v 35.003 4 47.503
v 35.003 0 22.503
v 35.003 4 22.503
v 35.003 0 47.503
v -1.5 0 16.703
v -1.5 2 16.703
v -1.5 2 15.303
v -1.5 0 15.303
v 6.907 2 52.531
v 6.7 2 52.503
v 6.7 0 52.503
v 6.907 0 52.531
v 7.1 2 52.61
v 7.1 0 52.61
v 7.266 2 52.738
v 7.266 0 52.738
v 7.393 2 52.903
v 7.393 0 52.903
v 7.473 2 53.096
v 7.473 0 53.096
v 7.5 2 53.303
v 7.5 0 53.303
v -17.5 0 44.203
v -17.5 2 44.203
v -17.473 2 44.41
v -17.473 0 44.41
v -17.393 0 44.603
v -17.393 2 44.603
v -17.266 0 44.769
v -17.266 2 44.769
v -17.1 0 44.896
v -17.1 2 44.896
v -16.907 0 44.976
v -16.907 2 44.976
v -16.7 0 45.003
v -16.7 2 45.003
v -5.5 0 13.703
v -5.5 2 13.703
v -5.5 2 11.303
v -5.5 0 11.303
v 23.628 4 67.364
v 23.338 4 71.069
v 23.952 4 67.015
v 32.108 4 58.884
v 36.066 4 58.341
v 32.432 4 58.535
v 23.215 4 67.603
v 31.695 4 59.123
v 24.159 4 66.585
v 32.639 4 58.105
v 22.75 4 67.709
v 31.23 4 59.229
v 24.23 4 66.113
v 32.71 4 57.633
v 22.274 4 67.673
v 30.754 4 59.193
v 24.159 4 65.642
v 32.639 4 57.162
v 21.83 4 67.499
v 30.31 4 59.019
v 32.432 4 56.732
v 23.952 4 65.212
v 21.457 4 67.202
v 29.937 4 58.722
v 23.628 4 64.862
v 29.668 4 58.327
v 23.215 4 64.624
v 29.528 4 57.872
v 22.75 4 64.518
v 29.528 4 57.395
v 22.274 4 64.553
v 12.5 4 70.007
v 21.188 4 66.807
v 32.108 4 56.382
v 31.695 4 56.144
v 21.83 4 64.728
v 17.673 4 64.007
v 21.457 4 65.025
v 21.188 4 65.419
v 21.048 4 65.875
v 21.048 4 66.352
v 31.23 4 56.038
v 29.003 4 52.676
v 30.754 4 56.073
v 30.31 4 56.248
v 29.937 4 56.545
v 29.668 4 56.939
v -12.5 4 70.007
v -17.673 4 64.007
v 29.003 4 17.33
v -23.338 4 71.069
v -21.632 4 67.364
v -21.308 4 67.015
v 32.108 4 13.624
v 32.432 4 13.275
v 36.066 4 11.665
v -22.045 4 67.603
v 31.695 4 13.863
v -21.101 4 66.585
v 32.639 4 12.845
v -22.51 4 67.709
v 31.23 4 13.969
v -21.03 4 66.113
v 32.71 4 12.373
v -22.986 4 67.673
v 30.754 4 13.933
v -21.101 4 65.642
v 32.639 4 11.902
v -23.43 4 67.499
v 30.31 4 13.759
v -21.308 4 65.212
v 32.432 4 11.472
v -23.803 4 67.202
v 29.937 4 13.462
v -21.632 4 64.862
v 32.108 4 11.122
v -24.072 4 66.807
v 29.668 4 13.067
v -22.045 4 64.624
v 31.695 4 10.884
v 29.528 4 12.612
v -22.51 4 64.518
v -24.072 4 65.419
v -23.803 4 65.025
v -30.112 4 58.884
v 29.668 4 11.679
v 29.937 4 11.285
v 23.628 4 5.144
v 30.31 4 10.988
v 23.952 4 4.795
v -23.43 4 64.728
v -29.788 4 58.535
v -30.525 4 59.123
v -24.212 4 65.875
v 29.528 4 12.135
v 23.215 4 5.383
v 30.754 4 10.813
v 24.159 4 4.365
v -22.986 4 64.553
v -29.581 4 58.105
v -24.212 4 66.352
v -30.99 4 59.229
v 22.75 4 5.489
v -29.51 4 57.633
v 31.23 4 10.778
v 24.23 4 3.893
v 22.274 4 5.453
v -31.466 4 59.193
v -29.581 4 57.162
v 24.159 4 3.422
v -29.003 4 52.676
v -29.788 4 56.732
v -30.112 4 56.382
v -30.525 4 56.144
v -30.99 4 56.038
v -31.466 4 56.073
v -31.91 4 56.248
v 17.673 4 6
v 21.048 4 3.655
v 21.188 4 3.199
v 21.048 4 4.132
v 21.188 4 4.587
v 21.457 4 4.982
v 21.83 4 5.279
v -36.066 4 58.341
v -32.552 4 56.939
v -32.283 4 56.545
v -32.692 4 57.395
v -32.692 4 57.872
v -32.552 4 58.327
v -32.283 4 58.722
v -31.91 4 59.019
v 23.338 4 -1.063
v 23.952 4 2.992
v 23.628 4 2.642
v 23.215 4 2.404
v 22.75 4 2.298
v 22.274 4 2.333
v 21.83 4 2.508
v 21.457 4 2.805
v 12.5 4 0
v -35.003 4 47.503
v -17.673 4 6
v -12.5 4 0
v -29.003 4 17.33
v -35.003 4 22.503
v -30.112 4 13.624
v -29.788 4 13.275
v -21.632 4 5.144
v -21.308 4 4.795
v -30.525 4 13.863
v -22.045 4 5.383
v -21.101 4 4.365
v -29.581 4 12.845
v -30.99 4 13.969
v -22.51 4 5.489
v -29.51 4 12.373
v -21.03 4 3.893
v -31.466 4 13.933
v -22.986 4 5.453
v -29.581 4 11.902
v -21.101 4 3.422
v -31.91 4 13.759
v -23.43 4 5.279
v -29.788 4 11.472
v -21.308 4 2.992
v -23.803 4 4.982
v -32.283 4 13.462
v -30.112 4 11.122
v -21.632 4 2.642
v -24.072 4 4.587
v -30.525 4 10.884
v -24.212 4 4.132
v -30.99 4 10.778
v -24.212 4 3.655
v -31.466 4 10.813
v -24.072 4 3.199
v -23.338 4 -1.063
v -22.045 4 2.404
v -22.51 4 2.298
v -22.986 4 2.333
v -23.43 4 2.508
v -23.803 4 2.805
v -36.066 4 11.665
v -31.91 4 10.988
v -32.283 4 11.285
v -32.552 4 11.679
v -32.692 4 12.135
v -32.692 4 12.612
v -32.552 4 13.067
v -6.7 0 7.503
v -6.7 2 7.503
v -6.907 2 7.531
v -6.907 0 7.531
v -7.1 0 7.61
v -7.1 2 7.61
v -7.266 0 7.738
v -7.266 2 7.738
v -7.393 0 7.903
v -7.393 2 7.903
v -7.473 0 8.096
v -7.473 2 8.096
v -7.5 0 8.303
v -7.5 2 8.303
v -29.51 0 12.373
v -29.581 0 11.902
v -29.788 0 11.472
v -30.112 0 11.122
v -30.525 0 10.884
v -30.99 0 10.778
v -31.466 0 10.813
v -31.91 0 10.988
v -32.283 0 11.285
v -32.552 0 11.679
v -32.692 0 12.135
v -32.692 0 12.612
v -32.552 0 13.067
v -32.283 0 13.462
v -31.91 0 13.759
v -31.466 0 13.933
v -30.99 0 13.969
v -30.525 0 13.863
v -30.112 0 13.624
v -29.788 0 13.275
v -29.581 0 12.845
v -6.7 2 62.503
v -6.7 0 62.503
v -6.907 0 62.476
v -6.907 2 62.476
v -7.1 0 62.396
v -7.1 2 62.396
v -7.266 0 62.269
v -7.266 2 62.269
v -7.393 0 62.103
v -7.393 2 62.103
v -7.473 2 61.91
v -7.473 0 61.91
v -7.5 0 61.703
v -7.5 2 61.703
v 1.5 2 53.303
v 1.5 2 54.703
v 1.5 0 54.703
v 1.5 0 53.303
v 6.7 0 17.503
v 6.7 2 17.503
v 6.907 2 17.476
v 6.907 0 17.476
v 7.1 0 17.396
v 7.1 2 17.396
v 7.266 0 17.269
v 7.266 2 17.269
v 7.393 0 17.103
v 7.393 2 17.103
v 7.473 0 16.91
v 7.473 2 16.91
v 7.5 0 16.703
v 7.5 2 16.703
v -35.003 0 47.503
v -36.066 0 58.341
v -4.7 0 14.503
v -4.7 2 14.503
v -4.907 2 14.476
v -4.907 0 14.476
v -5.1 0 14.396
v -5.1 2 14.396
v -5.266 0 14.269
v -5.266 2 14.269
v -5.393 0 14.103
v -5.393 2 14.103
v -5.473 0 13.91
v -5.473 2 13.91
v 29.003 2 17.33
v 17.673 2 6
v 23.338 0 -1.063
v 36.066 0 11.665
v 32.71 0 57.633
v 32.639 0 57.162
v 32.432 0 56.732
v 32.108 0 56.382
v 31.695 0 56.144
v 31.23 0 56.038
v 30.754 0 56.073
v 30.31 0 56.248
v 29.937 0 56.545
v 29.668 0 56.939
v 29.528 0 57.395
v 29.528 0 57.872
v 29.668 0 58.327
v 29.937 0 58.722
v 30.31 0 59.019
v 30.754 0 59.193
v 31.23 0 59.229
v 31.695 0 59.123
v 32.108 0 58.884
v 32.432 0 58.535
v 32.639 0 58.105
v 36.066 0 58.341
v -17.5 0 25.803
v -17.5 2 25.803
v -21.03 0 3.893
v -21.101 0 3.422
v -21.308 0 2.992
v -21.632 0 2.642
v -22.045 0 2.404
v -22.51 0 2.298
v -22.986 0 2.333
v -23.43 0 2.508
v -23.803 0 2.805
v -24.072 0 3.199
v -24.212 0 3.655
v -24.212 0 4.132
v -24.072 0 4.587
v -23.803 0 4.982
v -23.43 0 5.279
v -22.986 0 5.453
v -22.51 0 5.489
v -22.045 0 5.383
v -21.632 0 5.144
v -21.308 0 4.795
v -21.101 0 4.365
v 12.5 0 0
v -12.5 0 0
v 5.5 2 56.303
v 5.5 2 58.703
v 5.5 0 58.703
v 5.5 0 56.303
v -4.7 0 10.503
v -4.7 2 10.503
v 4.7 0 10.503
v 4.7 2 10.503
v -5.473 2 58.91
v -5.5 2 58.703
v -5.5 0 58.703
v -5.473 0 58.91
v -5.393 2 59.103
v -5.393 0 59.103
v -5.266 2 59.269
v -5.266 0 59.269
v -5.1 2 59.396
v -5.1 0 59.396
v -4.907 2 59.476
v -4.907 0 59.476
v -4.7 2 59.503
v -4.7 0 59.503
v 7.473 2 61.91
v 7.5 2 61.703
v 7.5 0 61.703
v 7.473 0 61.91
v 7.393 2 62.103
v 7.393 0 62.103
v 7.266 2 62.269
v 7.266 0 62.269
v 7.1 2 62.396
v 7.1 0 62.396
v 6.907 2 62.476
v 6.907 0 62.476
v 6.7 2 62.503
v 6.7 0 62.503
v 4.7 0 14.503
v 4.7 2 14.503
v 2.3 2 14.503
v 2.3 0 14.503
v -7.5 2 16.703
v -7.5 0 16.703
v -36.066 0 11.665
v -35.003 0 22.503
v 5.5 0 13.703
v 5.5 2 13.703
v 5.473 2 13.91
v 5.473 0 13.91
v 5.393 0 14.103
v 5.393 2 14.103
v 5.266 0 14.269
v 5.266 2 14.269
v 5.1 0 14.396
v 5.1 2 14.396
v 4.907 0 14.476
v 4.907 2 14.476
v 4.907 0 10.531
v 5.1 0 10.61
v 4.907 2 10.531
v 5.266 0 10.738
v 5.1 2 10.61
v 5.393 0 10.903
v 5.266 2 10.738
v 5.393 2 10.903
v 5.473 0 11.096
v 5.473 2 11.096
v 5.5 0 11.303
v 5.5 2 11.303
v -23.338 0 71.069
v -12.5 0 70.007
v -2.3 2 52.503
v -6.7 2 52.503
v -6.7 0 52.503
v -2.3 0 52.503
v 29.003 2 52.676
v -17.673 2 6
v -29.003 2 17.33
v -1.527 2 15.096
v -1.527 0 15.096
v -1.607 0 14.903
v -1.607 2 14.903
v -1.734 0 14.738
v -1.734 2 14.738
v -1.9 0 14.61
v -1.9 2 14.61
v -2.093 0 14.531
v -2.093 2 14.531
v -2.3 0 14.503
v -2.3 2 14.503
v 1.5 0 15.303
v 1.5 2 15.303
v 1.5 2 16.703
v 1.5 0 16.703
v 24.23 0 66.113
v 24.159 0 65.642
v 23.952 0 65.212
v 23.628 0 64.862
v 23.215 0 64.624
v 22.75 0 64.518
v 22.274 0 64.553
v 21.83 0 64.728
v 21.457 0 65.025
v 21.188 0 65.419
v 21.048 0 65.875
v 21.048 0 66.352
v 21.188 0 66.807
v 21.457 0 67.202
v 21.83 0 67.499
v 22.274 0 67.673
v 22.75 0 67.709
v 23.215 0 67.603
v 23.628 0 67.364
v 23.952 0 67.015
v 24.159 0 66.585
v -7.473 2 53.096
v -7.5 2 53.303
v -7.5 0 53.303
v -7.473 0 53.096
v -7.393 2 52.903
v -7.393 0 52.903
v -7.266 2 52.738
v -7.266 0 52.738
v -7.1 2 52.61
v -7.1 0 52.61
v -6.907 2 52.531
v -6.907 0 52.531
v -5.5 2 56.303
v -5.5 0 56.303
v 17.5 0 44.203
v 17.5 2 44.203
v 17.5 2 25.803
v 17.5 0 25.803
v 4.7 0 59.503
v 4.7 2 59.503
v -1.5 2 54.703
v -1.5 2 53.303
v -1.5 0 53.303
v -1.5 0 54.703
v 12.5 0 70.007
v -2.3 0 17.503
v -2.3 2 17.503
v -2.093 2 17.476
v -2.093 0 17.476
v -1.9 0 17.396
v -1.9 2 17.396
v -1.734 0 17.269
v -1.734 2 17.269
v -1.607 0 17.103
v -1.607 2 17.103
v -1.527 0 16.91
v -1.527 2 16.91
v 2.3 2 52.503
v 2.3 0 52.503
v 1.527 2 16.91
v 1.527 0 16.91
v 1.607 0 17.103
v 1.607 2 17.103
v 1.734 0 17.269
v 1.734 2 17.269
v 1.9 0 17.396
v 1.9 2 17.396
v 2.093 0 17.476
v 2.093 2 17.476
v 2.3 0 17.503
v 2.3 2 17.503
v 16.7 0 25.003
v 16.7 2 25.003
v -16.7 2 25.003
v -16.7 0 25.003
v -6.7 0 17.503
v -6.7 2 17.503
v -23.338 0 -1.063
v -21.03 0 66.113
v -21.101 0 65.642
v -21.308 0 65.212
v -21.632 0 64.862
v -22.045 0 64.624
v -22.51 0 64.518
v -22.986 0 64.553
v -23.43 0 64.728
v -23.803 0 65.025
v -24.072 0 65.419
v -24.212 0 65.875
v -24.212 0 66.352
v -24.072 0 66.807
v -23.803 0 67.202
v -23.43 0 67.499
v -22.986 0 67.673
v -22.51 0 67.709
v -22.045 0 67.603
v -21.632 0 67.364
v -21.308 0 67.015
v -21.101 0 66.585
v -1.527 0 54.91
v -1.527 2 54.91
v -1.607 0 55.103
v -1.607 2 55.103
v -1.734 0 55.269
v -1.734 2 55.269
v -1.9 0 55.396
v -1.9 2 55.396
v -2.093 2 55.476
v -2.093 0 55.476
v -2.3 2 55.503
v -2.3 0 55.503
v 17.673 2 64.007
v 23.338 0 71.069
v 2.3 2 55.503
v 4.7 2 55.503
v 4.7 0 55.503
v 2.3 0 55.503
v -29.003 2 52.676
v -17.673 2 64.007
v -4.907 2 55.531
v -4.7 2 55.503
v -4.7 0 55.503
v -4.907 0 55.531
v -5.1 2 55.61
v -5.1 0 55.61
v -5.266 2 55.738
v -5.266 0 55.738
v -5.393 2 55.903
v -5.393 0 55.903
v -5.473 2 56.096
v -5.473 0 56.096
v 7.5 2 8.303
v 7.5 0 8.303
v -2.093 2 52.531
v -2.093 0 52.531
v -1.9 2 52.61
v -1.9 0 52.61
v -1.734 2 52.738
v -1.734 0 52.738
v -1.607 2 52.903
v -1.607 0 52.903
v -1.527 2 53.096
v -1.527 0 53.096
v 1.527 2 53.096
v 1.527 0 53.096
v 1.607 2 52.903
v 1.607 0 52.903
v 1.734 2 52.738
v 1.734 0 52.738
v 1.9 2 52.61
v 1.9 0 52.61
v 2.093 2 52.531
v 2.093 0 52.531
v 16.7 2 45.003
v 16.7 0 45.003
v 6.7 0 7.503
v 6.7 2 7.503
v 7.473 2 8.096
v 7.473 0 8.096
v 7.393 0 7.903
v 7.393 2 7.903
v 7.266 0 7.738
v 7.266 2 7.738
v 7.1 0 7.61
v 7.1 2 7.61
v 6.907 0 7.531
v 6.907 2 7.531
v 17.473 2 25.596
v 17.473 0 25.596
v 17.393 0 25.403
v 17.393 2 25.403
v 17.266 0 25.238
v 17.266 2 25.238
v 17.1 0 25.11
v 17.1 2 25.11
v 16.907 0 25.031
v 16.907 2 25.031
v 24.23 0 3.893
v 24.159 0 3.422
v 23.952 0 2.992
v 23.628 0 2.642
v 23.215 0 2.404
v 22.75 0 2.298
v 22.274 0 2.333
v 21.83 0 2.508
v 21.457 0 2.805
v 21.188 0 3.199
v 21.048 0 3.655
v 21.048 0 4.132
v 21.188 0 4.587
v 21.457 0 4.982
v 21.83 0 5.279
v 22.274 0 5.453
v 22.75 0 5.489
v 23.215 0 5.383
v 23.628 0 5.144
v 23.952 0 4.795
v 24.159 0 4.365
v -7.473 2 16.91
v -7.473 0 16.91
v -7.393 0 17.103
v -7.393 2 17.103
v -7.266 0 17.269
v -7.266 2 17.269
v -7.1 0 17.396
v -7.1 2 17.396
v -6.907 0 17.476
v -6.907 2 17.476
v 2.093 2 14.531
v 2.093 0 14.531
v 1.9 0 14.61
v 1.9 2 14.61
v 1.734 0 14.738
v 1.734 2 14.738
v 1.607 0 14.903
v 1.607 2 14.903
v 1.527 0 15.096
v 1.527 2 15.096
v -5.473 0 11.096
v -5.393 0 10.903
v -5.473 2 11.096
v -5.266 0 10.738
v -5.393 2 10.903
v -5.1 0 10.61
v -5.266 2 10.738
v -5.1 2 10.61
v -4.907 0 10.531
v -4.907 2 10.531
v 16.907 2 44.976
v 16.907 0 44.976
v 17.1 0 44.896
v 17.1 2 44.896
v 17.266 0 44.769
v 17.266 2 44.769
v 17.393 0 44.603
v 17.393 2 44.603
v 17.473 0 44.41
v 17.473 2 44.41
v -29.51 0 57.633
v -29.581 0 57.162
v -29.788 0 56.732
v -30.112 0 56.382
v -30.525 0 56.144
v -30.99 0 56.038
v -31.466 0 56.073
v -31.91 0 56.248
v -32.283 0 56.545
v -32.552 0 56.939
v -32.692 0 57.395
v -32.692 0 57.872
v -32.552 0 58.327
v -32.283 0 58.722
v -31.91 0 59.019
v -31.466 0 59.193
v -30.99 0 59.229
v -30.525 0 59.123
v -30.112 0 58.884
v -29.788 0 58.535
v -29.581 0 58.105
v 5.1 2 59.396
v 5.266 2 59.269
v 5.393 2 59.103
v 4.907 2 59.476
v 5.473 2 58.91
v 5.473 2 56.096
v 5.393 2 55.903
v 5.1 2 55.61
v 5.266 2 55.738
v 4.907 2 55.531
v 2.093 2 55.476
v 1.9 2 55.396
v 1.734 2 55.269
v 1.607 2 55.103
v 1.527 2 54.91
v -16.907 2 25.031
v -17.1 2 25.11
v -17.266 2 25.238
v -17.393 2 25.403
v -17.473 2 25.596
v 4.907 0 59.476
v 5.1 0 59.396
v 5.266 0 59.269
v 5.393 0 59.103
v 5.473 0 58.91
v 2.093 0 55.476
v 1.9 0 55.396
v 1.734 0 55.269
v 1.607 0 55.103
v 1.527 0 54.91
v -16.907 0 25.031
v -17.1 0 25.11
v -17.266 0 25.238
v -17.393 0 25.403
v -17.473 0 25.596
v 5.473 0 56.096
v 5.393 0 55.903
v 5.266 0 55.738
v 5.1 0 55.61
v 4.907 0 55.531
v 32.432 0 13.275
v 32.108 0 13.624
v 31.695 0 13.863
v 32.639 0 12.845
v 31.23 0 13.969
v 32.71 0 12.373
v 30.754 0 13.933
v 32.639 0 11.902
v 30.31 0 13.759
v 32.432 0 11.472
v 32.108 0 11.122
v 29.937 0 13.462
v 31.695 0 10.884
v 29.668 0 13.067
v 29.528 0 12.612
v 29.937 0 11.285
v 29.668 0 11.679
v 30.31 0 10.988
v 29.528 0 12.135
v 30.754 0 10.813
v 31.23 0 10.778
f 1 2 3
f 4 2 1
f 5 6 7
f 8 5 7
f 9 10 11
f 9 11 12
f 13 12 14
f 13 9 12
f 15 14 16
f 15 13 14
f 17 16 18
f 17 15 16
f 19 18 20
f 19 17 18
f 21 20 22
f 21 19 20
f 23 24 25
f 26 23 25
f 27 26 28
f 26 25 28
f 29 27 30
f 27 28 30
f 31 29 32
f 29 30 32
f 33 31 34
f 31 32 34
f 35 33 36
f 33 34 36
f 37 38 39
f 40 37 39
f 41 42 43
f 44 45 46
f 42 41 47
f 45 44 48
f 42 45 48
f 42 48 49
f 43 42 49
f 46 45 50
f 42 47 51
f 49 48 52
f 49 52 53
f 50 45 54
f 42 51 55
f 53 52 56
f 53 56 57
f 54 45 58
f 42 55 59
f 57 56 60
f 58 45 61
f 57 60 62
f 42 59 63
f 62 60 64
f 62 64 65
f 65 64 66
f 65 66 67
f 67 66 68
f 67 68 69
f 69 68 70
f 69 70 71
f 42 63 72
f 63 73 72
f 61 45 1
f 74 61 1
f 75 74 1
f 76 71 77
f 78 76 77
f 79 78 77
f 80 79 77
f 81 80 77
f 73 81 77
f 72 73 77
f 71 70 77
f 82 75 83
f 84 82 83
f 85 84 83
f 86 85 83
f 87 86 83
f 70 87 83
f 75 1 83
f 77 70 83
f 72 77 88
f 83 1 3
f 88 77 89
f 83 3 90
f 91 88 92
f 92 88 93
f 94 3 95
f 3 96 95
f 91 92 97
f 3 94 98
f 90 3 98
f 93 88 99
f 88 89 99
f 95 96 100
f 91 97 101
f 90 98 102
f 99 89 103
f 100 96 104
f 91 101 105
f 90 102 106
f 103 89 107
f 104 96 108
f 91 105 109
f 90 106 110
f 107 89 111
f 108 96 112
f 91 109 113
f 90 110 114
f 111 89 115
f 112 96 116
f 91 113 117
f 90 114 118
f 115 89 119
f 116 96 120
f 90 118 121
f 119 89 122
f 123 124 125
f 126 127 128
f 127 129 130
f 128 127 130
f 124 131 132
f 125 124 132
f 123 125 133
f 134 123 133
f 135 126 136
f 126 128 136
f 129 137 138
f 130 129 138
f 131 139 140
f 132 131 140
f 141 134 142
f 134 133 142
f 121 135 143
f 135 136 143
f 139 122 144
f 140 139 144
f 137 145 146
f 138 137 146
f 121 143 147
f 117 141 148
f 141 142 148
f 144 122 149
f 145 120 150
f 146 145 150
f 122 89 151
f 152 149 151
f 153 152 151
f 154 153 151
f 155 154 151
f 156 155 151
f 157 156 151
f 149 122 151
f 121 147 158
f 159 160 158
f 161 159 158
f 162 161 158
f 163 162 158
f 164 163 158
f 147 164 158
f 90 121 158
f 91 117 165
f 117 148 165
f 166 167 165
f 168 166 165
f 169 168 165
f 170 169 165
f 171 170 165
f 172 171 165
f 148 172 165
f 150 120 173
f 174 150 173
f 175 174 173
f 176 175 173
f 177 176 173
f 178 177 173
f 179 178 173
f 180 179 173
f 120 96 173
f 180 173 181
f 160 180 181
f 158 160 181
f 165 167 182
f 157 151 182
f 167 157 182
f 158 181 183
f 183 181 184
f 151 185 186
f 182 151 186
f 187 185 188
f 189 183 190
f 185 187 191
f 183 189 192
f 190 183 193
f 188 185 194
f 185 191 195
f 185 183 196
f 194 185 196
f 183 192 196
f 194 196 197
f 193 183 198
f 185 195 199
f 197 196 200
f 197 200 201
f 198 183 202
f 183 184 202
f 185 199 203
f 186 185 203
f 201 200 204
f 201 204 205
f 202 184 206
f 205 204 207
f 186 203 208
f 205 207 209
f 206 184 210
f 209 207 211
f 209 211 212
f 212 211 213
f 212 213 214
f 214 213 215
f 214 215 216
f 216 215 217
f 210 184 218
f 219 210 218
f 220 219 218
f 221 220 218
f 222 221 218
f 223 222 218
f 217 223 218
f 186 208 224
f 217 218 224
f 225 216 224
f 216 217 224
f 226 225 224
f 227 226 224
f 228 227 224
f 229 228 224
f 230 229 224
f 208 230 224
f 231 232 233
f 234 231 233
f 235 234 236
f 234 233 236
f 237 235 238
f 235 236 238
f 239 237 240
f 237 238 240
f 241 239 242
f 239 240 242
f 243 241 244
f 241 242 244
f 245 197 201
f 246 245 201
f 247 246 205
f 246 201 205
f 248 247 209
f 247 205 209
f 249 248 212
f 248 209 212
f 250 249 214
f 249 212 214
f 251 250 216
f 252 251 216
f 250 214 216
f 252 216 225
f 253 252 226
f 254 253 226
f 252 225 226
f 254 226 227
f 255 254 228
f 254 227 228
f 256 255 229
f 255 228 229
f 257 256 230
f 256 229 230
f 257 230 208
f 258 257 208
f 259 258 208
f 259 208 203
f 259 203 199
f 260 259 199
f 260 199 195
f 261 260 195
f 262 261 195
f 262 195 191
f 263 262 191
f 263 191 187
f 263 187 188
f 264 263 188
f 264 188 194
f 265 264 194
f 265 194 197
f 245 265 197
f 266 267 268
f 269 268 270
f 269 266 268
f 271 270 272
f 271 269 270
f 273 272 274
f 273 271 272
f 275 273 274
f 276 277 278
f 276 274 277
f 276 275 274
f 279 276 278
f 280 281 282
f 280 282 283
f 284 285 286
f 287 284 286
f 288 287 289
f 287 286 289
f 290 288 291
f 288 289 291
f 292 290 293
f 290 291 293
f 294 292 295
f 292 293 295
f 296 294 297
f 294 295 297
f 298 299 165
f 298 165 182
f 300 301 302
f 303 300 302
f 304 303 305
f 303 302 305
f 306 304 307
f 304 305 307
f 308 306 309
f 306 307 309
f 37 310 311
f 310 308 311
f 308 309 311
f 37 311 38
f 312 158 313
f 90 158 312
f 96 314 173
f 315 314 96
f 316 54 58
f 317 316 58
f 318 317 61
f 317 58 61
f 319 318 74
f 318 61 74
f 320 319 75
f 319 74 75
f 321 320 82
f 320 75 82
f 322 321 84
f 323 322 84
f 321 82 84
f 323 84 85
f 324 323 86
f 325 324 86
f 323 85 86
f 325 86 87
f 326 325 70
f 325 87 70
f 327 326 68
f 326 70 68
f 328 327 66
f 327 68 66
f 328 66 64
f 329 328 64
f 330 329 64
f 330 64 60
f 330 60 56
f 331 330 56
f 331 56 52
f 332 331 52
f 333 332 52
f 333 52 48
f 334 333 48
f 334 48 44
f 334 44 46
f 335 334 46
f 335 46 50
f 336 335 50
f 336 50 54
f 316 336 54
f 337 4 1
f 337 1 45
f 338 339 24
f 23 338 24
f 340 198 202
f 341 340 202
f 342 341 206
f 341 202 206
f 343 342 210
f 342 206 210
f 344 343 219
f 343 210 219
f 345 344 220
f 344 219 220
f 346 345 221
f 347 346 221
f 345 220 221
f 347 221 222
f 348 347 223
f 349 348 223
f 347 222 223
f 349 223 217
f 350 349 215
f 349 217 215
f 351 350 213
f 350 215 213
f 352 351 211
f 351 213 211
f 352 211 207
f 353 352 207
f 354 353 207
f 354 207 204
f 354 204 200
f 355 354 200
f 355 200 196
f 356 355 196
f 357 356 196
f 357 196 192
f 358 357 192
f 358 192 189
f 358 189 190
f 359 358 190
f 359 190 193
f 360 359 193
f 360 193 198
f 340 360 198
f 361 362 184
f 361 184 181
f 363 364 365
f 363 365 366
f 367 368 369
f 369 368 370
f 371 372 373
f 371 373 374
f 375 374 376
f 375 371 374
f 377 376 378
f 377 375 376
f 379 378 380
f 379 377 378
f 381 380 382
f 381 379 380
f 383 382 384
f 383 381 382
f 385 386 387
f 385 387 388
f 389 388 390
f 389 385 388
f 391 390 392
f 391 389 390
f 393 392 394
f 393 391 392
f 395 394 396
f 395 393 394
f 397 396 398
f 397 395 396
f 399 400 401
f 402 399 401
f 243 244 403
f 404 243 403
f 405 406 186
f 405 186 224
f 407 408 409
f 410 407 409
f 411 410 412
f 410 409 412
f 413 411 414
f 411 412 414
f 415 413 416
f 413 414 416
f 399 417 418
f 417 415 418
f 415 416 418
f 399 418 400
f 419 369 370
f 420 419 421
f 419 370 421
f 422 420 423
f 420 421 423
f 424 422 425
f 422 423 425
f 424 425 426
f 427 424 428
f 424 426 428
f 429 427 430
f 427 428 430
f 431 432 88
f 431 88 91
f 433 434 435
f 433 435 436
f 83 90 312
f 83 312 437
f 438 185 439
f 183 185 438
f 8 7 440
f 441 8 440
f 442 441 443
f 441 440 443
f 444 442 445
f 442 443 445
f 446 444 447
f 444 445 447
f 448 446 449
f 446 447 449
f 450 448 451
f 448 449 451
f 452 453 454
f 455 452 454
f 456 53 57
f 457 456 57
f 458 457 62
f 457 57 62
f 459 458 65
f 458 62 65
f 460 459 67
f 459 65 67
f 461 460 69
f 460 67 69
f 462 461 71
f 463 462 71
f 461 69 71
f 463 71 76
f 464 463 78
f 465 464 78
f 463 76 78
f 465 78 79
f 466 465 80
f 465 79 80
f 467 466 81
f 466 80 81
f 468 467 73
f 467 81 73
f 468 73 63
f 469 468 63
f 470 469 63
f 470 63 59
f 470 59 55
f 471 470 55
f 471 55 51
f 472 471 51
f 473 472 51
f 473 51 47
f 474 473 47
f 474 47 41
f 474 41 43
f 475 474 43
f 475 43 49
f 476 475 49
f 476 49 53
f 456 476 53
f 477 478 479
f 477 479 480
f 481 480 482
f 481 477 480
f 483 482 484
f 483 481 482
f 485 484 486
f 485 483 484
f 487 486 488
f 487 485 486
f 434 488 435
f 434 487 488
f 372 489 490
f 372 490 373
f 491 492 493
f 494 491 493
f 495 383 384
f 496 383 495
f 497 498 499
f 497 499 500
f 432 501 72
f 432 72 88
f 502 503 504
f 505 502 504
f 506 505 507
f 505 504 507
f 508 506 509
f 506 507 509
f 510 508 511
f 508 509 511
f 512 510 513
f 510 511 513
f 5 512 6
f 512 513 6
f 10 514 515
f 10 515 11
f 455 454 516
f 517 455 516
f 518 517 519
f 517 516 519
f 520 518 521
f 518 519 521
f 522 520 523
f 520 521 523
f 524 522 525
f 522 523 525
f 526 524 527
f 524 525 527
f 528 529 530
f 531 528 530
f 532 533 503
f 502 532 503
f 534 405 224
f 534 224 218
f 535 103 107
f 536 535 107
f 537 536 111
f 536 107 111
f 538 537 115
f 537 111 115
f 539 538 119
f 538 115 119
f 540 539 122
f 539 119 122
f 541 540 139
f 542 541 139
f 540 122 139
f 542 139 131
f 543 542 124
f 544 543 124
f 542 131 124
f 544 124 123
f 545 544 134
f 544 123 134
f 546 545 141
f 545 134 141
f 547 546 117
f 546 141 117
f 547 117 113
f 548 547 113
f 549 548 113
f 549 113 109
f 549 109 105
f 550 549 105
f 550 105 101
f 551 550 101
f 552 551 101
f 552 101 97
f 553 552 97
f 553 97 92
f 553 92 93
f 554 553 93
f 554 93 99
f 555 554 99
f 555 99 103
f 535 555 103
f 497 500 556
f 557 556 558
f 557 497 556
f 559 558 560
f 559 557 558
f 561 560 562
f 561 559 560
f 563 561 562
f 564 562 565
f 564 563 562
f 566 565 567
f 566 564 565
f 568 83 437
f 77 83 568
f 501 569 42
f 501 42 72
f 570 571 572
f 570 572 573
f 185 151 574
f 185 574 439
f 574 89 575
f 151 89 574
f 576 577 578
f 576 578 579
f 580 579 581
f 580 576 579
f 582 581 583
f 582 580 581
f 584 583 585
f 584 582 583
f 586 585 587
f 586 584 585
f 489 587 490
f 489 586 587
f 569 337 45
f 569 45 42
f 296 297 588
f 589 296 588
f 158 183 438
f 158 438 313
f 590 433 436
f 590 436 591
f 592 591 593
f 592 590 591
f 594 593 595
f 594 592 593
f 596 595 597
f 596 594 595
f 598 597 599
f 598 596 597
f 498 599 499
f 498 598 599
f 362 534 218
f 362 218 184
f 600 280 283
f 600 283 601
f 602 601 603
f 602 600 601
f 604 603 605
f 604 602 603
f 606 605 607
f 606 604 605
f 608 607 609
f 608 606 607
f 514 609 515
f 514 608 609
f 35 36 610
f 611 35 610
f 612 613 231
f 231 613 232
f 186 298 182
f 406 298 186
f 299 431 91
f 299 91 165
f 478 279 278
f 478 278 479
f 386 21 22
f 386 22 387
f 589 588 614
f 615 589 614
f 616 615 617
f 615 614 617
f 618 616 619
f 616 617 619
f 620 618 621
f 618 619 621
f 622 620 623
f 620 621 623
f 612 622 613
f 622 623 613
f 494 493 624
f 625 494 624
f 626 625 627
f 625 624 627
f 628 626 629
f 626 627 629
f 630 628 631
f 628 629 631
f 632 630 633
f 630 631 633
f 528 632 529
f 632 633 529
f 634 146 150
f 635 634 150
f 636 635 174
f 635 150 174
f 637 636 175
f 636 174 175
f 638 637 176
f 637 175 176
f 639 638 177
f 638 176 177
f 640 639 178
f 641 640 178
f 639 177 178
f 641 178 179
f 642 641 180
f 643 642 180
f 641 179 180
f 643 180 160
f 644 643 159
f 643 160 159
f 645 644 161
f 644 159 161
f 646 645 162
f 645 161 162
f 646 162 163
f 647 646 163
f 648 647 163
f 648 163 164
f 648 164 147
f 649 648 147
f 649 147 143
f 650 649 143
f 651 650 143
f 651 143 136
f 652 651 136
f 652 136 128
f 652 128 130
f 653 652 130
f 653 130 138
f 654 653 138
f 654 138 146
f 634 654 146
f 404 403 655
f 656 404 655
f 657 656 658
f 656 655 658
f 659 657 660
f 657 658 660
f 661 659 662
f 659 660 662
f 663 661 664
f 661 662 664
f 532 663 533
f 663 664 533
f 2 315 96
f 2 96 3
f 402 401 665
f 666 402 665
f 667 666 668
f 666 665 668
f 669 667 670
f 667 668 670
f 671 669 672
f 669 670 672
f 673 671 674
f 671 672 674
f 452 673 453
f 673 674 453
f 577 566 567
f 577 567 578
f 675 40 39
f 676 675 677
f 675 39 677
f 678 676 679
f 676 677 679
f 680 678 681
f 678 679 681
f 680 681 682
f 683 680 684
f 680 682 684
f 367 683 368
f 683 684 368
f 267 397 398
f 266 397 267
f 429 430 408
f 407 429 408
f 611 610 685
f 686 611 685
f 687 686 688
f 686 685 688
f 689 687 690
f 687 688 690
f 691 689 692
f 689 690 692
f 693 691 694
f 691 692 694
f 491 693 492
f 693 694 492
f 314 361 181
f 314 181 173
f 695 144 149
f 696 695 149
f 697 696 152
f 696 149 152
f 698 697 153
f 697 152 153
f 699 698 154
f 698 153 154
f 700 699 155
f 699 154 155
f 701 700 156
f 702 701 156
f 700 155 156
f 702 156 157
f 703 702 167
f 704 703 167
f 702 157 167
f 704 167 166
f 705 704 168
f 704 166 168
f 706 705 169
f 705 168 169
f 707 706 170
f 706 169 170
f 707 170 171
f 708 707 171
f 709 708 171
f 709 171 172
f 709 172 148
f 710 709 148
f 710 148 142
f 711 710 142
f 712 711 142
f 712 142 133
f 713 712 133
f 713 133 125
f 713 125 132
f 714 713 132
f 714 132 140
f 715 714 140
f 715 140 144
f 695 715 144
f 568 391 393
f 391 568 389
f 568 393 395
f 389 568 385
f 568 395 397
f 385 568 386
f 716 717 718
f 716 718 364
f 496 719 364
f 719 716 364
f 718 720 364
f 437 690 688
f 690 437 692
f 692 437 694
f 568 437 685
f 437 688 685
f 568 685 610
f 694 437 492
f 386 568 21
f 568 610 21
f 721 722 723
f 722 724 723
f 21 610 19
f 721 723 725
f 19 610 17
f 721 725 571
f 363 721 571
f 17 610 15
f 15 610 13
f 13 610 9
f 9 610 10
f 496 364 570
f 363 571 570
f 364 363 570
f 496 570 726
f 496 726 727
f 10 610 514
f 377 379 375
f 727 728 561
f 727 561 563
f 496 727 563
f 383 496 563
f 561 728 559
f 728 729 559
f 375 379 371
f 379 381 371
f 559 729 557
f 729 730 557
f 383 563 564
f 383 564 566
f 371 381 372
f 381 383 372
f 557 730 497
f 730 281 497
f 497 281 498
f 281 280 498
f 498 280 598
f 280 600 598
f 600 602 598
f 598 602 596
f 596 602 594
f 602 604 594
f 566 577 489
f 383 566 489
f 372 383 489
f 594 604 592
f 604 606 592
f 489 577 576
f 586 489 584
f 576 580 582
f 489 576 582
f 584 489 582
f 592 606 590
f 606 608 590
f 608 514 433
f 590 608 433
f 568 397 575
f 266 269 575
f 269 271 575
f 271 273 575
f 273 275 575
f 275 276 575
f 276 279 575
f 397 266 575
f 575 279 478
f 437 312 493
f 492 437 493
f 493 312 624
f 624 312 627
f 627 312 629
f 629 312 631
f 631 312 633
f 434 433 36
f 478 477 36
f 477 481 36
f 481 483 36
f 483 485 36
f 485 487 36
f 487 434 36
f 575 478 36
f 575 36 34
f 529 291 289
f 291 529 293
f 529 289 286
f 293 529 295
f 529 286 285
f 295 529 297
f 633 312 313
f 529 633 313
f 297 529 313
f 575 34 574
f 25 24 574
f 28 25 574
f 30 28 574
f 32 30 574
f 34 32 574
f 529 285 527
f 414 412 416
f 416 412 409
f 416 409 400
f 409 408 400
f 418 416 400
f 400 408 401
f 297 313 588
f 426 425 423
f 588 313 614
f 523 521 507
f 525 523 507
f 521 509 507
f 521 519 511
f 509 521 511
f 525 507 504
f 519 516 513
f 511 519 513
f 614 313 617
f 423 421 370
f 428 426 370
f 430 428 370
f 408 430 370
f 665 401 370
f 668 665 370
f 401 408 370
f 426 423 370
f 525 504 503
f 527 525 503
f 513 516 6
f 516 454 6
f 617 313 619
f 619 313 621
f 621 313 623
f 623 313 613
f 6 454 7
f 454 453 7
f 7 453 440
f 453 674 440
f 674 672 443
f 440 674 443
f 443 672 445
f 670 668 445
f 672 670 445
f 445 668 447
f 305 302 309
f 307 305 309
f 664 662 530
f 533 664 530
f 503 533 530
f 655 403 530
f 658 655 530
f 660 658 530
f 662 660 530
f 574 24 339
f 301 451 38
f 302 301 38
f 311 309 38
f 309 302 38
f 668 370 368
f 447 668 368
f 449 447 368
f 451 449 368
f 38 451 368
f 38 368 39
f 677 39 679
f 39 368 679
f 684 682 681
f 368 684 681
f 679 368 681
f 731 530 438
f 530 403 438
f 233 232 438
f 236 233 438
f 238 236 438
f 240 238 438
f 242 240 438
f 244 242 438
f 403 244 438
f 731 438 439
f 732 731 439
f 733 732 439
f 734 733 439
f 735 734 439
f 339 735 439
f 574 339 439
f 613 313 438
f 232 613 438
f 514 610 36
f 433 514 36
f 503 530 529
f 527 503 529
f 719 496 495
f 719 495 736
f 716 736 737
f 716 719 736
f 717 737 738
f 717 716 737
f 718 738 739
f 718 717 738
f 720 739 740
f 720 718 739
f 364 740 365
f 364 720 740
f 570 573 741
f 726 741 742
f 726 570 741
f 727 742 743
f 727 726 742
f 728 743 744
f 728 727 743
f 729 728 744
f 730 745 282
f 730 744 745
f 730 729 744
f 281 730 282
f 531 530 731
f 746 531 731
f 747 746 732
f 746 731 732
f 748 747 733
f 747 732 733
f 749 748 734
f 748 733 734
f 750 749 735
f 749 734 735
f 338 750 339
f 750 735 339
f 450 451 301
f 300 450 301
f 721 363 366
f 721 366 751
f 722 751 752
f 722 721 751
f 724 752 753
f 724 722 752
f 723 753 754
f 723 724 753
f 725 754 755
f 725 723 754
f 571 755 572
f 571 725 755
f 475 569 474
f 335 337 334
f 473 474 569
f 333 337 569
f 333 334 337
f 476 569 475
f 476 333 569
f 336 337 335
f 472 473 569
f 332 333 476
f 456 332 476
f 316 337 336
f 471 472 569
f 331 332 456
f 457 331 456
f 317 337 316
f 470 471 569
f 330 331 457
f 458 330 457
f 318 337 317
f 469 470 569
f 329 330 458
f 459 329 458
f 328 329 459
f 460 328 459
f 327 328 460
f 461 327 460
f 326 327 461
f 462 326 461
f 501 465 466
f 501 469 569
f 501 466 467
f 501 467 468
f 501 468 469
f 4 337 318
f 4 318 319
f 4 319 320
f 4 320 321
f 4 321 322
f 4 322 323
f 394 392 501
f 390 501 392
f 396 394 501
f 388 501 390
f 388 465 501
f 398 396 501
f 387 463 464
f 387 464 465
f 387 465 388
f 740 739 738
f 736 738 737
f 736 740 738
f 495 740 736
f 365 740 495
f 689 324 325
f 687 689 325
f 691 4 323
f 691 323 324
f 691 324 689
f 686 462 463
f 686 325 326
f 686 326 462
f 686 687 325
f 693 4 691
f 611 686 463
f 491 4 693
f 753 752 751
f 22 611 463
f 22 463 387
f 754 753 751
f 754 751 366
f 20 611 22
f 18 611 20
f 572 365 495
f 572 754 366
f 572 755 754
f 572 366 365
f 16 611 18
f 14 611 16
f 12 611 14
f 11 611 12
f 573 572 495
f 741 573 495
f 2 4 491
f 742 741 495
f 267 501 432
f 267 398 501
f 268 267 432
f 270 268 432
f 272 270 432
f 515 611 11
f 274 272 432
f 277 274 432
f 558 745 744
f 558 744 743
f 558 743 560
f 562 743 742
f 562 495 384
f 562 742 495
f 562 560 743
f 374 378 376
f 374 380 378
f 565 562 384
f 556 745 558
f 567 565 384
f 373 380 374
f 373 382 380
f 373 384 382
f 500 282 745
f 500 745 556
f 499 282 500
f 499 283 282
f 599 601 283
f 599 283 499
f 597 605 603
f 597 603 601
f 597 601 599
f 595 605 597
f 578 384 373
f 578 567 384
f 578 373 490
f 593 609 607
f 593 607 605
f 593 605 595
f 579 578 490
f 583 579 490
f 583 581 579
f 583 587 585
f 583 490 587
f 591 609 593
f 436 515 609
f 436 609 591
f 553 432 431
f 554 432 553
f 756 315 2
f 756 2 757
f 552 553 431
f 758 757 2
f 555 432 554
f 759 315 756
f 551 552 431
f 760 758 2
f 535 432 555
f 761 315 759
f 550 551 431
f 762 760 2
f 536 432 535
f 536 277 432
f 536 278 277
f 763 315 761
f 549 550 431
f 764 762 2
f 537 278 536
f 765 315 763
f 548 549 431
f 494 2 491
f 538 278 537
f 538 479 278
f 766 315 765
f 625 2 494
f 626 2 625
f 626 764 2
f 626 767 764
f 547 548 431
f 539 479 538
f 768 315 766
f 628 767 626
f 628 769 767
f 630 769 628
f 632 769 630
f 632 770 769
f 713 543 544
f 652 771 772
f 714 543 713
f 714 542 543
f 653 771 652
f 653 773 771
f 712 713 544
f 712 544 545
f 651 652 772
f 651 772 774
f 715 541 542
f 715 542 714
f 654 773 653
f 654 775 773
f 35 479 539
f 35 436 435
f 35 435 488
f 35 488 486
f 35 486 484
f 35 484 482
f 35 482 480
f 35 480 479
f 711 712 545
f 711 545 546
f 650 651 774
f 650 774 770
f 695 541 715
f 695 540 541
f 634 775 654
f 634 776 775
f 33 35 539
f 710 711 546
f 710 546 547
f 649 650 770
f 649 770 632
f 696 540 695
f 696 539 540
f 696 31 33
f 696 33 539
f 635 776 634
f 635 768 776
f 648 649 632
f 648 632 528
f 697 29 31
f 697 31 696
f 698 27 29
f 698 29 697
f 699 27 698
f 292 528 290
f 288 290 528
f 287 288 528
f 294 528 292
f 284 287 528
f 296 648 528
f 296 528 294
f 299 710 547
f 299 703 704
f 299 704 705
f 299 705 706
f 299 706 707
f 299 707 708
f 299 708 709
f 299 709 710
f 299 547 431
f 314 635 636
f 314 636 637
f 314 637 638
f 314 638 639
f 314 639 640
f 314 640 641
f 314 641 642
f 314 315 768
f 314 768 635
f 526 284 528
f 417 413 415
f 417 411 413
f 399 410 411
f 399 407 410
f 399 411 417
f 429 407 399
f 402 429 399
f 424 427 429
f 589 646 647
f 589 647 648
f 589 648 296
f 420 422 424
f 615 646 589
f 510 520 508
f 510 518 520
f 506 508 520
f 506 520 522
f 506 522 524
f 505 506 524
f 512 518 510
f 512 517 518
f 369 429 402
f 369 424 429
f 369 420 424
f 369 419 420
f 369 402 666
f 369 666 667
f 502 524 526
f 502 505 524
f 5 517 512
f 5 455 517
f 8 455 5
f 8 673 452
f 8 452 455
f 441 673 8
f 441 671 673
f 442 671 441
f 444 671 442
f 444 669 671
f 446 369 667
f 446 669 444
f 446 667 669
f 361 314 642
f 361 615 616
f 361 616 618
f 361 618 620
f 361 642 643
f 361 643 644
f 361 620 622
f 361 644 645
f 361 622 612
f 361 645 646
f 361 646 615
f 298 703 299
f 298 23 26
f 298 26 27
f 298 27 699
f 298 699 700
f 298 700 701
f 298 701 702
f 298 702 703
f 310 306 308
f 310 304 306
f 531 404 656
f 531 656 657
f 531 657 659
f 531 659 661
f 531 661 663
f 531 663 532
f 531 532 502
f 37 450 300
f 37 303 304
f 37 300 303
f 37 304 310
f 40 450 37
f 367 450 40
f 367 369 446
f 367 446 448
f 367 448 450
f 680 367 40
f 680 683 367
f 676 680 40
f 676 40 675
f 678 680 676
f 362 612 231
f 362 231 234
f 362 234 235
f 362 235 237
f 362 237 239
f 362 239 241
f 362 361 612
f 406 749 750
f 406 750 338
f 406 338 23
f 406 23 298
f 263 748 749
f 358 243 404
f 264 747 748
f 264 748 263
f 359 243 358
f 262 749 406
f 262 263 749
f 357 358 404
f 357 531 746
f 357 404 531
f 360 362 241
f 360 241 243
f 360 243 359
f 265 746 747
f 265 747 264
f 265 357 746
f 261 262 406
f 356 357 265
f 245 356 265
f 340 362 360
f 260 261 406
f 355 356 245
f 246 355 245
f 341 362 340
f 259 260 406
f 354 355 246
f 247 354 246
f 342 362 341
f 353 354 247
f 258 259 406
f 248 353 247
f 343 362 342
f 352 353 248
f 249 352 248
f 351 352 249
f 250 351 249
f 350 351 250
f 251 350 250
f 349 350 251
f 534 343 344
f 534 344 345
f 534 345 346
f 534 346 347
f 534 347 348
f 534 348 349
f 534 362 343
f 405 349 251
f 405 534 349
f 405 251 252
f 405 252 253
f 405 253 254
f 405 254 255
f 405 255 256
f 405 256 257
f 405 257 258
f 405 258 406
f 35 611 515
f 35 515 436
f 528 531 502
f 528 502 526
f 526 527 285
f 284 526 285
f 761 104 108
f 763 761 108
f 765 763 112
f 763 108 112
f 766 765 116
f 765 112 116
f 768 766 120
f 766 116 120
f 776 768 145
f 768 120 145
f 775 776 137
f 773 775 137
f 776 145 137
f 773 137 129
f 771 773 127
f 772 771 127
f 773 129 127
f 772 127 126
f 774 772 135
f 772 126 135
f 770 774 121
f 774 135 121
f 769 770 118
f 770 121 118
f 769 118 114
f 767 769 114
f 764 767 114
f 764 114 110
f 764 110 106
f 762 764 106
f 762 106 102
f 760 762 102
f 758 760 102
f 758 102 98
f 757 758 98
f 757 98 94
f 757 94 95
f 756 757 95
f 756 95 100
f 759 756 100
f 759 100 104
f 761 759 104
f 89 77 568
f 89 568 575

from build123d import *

# Parameters (mm, degrees)
BOSS_EXTRUDE1_DEPTH = 4
SKETCH2_R           = 1.6
CUT_EXTRUDE1_DEPTH  = 5
CUT_EXTRUDE2_DEPTH  = 2
CUT_EXTRUDE3_DEPTH  = 3


with BuildPart() as part:
    # Sketch1 → Boss-Extrude1 (new body)
    with BuildSketch(Plane(origin=(0, 0, 0), x_dir=(1, 0, 0), z_dir=(0, 1, 0))):
        Polygon((-12.5, 0), (12.5, 0), (23.338026386, 1.062677778), (36.065948447, -11.665244283), (35.003270669, -22.503270669), (35.003270669, -47.503270669), (36.065948447, -58.341297055), (23.338026386, -71.069219116), (12.5, -70.006541338), (-12.5, -70.006541338), (-23.338026386, -71.069219116), (-36.065948447, -58.341297055), (-35.003270669, -47.503270669), (-35.003270669, -22.503270669), (-36.065948447, -11.665244283), (-23.338026386, 1.062677778), align=None)
    extrude(amount=BOSS_EXTRUDE1_DEPTH)

    # Sketch2 → Cut-Extrude1 (cut, through all)
    with BuildSketch(Plane(origin=(0, 4, 0), x_dir=(1, 0, 0), z_dir=(0, 1, 0))):
        with Locations((22.63, -3.893270669)):
            Circle(SKETCH2_R)
        with Locations((31.11, -12.373270669)):
            Circle(SKETCH2_R)
        with Locations((-31.11, -12.373270669)):
            Circle(SKETCH2_R)
        with Locations((-22.63, -3.893270669)):
            Circle(SKETCH2_R)
        with Locations((31.11, -57.633270669)):
            Circle(SKETCH2_R)
        with Locations((22.63, -66.113270669)):
            Circle(SKETCH2_R)
        with Locations((-22.63, -66.113270669)):
            Circle(SKETCH2_R)
        with Locations((-31.11, -57.633270669)):
            Circle(SKETCH2_R)
    extrude(amount=-CUT_EXTRUDE1_DEPTH, mode=Mode.SUBTRACT)

    # Sketch3 → Cut-Extrude2 (cut)
    with BuildSketch(Plane(origin=(0, 4, 0), x_dir=(1, 0, 0), z_dir=(0, 1, 0))):
        Polygon((-17.672782103, -6), (17.672782103, -6), (29.003270669, -17.330488566), (29.003270669, -52.676052772), (17.672782103, -64.006541338), (-17.672782103, -64.006541338), (-29.003270669, -52.676052772), (-29.003270669, -17.330488566), align=None)
    extrude(amount=-CUT_EXTRUDE2_DEPTH, mode=Mode.SUBTRACT)

    # Sketch4 → Cut-Extrude3 (cut, through all)
    with BuildSketch(Plane(origin=(0, 2, 0), x_dir=(1, 0, 0), z_dir=(0, 1, 0))):
        with BuildLine():
            Line((-16.7, -45.003270669), (16.7, -45.003270669))
            ThreePointArc((16.7, -45.003270669), (17.265685425, -44.768956094), (17.5, -44.203270669))
            Line((17.5, -44.203270669), (17.5, -25.803270669))
            ThreePointArc((17.5, -25.803270669), (17.265685425, -25.237585244), (16.7, -25.003270669))
            Line((16.7, -25.003270669), (-16.7, -25.003270669))
            ThreePointArc((-16.7, -25.003270669), (-17.265685425, -25.237585244), (-17.5, -25.803270669))
            Line((-17.5, -25.803270669), (-17.5, -44.203270669))
            ThreePointArc((-17.5, -44.203270669), (-17.265685425, -44.768956094), (-16.7, -45.003270669))
        make_face()
        with BuildLine():
            Line((-1.5, -16.703270669), (-1.5, -15.303270669))
            ThreePointArc((-1.5, -15.303270669), (-1.734314575, -14.737585244), (-2.3, -14.503270669))
            Line((-2.3, -14.503270669), (-4.7, -14.503270669))
            ThreePointArc((-4.7, -14.503270669), (-5.265685425, -14.268956094), (-5.5, -13.703270669))
            Line((-5.5, -13.703270669), (-5.5, -11.303270669))
            ThreePointArc((-5.5, -11.303270669), (-5.265685425, -10.737585244), (-4.7, -10.503270669))
            Line((-4.7, -10.503270669), (4.7, -10.503270669))
            ThreePointArc((4.7, -10.503270669), (5.265685425, -10.737585244), (5.5, -11.303270669))
            Line((5.5, -11.303270669), (5.5, -13.703270669))
            ThreePointArc((5.5, -13.703270669), (5.265685425, -14.268956094), (4.7, -14.503270669))
            Line((4.7, -14.503270669), (2.3, -14.503270669))
            ThreePointArc((2.3, -14.503270669), (1.734314575, -14.737585244), (1.5, -15.303270669))
            Line((1.5, -15.303270669), (1.5, -16.703270669))
            ThreePointArc((1.5, -16.703270669), (1.734314575, -17.268956094), (2.3, -17.503270669))
            Line((2.3, -17.503270669), (6.7, -17.503270669))
            ThreePointArc((6.7, -17.503270669), (7.265685425, -17.268956094), (7.5, -16.703270669))
            Line((7.5, -16.703270669), (7.5, -8.303270669))
            ThreePointArc((7.5, -8.303270669), (7.265685425, -7.737585244), (6.7, -7.503270669))
            Line((6.7, -7.503270669), (-6.7, -7.503270669))
            ThreePointArc((-6.7, -7.503270669), (-7.265685425, -7.737585244), (-7.5, -8.303270669))
            Line((-7.5, -8.303270669), (-7.5, -16.703270669))
            ThreePointArc((-7.5, -16.703270669), (-7.265685425, -17.268956094), (-6.7, -17.503270669))
            Line((-6.7, -17.503270669), (-2.3, -17.503270669))
            ThreePointArc((-2.3, -17.503270669), (-1.734314575, -17.268956094), (-1.5, -16.703270669))
        make_face()
        with BuildLine():
            Line((-5.5, -56.303270669), (-5.5, -58.703270669))
            ThreePointArc((-5.5, -58.703270669), (-5.265685425, -59.268956094), (-4.7, -59.503270669))
            Line((-4.7, -59.503270669), (4.7, -59.503270669))
            ThreePointArc((4.7, -59.503270669), (5.265685425, -59.268956094), (5.5, -58.703270669))
            Line((5.5, -58.703270669), (5.5, -56.303270669))
            ThreePointArc((5.5, -56.303270669), (5.265685425, -55.737585244), (4.7, -55.503270669))
            Line((4.7, -55.503270669), (2.3, -55.503270669))
            ThreePointArc((2.3, -55.503270669), (1.734314575, -55.268956094), (1.5, -54.703270669))
            Line((1.5, -54.703270669), (1.5, -53.303270669))
            ThreePointArc((1.5, -53.303270669), (1.734314575, -52.737585244), (2.3, -52.503270669))
            Line((2.3, -52.503270669), (6.7, -52.503270669))
            ThreePointArc((6.7, -52.503270669), (7.265685425, -52.737585244), (7.5, -53.303270669))
            Line((7.5, -53.303270669), (7.5, -61.703270669))
            ThreePointArc((7.5, -61.703270669), (7.265685425, -62.268956094), (6.7, -62.503270669))
            Line((6.7, -62.503270669), (-6.7, -62.503270669))
            ThreePointArc((-6.7, -62.503270669), (-7.265685425, -62.268956094), (-7.5, -61.703270669))
            Line((-7.5, -61.703270669), (-7.5, -53.303270669))
            ThreePointArc((-7.5, -53.303270669), (-7.265685425, -52.737585244), (-6.7, -52.503270669))
            Line((-6.7, -52.503270669), (-2.3, -52.503270669))
            ThreePointArc((-2.3, -52.503270669), (-1.734314575, -52.737585244), (-1.5, -53.303270669))
            Line((-1.5, -53.303270669), (-1.5, -54.703270669))
            ThreePointArc((-1.5, -54.703270669), (-1.734314575, -55.268956094), (-2.3, -55.503270669))
            Line((-2.3, -55.503270669), (-4.7, -55.503270669))
            ThreePointArc((-4.7, -55.503270669), (-5.265685425, -55.737585244), (-5.5, -56.303270669))
        make_face()
    extrude(amount=-CUT_EXTRUDE3_DEPTH, mode=Mode.SUBTRACT)


solid = part.part
